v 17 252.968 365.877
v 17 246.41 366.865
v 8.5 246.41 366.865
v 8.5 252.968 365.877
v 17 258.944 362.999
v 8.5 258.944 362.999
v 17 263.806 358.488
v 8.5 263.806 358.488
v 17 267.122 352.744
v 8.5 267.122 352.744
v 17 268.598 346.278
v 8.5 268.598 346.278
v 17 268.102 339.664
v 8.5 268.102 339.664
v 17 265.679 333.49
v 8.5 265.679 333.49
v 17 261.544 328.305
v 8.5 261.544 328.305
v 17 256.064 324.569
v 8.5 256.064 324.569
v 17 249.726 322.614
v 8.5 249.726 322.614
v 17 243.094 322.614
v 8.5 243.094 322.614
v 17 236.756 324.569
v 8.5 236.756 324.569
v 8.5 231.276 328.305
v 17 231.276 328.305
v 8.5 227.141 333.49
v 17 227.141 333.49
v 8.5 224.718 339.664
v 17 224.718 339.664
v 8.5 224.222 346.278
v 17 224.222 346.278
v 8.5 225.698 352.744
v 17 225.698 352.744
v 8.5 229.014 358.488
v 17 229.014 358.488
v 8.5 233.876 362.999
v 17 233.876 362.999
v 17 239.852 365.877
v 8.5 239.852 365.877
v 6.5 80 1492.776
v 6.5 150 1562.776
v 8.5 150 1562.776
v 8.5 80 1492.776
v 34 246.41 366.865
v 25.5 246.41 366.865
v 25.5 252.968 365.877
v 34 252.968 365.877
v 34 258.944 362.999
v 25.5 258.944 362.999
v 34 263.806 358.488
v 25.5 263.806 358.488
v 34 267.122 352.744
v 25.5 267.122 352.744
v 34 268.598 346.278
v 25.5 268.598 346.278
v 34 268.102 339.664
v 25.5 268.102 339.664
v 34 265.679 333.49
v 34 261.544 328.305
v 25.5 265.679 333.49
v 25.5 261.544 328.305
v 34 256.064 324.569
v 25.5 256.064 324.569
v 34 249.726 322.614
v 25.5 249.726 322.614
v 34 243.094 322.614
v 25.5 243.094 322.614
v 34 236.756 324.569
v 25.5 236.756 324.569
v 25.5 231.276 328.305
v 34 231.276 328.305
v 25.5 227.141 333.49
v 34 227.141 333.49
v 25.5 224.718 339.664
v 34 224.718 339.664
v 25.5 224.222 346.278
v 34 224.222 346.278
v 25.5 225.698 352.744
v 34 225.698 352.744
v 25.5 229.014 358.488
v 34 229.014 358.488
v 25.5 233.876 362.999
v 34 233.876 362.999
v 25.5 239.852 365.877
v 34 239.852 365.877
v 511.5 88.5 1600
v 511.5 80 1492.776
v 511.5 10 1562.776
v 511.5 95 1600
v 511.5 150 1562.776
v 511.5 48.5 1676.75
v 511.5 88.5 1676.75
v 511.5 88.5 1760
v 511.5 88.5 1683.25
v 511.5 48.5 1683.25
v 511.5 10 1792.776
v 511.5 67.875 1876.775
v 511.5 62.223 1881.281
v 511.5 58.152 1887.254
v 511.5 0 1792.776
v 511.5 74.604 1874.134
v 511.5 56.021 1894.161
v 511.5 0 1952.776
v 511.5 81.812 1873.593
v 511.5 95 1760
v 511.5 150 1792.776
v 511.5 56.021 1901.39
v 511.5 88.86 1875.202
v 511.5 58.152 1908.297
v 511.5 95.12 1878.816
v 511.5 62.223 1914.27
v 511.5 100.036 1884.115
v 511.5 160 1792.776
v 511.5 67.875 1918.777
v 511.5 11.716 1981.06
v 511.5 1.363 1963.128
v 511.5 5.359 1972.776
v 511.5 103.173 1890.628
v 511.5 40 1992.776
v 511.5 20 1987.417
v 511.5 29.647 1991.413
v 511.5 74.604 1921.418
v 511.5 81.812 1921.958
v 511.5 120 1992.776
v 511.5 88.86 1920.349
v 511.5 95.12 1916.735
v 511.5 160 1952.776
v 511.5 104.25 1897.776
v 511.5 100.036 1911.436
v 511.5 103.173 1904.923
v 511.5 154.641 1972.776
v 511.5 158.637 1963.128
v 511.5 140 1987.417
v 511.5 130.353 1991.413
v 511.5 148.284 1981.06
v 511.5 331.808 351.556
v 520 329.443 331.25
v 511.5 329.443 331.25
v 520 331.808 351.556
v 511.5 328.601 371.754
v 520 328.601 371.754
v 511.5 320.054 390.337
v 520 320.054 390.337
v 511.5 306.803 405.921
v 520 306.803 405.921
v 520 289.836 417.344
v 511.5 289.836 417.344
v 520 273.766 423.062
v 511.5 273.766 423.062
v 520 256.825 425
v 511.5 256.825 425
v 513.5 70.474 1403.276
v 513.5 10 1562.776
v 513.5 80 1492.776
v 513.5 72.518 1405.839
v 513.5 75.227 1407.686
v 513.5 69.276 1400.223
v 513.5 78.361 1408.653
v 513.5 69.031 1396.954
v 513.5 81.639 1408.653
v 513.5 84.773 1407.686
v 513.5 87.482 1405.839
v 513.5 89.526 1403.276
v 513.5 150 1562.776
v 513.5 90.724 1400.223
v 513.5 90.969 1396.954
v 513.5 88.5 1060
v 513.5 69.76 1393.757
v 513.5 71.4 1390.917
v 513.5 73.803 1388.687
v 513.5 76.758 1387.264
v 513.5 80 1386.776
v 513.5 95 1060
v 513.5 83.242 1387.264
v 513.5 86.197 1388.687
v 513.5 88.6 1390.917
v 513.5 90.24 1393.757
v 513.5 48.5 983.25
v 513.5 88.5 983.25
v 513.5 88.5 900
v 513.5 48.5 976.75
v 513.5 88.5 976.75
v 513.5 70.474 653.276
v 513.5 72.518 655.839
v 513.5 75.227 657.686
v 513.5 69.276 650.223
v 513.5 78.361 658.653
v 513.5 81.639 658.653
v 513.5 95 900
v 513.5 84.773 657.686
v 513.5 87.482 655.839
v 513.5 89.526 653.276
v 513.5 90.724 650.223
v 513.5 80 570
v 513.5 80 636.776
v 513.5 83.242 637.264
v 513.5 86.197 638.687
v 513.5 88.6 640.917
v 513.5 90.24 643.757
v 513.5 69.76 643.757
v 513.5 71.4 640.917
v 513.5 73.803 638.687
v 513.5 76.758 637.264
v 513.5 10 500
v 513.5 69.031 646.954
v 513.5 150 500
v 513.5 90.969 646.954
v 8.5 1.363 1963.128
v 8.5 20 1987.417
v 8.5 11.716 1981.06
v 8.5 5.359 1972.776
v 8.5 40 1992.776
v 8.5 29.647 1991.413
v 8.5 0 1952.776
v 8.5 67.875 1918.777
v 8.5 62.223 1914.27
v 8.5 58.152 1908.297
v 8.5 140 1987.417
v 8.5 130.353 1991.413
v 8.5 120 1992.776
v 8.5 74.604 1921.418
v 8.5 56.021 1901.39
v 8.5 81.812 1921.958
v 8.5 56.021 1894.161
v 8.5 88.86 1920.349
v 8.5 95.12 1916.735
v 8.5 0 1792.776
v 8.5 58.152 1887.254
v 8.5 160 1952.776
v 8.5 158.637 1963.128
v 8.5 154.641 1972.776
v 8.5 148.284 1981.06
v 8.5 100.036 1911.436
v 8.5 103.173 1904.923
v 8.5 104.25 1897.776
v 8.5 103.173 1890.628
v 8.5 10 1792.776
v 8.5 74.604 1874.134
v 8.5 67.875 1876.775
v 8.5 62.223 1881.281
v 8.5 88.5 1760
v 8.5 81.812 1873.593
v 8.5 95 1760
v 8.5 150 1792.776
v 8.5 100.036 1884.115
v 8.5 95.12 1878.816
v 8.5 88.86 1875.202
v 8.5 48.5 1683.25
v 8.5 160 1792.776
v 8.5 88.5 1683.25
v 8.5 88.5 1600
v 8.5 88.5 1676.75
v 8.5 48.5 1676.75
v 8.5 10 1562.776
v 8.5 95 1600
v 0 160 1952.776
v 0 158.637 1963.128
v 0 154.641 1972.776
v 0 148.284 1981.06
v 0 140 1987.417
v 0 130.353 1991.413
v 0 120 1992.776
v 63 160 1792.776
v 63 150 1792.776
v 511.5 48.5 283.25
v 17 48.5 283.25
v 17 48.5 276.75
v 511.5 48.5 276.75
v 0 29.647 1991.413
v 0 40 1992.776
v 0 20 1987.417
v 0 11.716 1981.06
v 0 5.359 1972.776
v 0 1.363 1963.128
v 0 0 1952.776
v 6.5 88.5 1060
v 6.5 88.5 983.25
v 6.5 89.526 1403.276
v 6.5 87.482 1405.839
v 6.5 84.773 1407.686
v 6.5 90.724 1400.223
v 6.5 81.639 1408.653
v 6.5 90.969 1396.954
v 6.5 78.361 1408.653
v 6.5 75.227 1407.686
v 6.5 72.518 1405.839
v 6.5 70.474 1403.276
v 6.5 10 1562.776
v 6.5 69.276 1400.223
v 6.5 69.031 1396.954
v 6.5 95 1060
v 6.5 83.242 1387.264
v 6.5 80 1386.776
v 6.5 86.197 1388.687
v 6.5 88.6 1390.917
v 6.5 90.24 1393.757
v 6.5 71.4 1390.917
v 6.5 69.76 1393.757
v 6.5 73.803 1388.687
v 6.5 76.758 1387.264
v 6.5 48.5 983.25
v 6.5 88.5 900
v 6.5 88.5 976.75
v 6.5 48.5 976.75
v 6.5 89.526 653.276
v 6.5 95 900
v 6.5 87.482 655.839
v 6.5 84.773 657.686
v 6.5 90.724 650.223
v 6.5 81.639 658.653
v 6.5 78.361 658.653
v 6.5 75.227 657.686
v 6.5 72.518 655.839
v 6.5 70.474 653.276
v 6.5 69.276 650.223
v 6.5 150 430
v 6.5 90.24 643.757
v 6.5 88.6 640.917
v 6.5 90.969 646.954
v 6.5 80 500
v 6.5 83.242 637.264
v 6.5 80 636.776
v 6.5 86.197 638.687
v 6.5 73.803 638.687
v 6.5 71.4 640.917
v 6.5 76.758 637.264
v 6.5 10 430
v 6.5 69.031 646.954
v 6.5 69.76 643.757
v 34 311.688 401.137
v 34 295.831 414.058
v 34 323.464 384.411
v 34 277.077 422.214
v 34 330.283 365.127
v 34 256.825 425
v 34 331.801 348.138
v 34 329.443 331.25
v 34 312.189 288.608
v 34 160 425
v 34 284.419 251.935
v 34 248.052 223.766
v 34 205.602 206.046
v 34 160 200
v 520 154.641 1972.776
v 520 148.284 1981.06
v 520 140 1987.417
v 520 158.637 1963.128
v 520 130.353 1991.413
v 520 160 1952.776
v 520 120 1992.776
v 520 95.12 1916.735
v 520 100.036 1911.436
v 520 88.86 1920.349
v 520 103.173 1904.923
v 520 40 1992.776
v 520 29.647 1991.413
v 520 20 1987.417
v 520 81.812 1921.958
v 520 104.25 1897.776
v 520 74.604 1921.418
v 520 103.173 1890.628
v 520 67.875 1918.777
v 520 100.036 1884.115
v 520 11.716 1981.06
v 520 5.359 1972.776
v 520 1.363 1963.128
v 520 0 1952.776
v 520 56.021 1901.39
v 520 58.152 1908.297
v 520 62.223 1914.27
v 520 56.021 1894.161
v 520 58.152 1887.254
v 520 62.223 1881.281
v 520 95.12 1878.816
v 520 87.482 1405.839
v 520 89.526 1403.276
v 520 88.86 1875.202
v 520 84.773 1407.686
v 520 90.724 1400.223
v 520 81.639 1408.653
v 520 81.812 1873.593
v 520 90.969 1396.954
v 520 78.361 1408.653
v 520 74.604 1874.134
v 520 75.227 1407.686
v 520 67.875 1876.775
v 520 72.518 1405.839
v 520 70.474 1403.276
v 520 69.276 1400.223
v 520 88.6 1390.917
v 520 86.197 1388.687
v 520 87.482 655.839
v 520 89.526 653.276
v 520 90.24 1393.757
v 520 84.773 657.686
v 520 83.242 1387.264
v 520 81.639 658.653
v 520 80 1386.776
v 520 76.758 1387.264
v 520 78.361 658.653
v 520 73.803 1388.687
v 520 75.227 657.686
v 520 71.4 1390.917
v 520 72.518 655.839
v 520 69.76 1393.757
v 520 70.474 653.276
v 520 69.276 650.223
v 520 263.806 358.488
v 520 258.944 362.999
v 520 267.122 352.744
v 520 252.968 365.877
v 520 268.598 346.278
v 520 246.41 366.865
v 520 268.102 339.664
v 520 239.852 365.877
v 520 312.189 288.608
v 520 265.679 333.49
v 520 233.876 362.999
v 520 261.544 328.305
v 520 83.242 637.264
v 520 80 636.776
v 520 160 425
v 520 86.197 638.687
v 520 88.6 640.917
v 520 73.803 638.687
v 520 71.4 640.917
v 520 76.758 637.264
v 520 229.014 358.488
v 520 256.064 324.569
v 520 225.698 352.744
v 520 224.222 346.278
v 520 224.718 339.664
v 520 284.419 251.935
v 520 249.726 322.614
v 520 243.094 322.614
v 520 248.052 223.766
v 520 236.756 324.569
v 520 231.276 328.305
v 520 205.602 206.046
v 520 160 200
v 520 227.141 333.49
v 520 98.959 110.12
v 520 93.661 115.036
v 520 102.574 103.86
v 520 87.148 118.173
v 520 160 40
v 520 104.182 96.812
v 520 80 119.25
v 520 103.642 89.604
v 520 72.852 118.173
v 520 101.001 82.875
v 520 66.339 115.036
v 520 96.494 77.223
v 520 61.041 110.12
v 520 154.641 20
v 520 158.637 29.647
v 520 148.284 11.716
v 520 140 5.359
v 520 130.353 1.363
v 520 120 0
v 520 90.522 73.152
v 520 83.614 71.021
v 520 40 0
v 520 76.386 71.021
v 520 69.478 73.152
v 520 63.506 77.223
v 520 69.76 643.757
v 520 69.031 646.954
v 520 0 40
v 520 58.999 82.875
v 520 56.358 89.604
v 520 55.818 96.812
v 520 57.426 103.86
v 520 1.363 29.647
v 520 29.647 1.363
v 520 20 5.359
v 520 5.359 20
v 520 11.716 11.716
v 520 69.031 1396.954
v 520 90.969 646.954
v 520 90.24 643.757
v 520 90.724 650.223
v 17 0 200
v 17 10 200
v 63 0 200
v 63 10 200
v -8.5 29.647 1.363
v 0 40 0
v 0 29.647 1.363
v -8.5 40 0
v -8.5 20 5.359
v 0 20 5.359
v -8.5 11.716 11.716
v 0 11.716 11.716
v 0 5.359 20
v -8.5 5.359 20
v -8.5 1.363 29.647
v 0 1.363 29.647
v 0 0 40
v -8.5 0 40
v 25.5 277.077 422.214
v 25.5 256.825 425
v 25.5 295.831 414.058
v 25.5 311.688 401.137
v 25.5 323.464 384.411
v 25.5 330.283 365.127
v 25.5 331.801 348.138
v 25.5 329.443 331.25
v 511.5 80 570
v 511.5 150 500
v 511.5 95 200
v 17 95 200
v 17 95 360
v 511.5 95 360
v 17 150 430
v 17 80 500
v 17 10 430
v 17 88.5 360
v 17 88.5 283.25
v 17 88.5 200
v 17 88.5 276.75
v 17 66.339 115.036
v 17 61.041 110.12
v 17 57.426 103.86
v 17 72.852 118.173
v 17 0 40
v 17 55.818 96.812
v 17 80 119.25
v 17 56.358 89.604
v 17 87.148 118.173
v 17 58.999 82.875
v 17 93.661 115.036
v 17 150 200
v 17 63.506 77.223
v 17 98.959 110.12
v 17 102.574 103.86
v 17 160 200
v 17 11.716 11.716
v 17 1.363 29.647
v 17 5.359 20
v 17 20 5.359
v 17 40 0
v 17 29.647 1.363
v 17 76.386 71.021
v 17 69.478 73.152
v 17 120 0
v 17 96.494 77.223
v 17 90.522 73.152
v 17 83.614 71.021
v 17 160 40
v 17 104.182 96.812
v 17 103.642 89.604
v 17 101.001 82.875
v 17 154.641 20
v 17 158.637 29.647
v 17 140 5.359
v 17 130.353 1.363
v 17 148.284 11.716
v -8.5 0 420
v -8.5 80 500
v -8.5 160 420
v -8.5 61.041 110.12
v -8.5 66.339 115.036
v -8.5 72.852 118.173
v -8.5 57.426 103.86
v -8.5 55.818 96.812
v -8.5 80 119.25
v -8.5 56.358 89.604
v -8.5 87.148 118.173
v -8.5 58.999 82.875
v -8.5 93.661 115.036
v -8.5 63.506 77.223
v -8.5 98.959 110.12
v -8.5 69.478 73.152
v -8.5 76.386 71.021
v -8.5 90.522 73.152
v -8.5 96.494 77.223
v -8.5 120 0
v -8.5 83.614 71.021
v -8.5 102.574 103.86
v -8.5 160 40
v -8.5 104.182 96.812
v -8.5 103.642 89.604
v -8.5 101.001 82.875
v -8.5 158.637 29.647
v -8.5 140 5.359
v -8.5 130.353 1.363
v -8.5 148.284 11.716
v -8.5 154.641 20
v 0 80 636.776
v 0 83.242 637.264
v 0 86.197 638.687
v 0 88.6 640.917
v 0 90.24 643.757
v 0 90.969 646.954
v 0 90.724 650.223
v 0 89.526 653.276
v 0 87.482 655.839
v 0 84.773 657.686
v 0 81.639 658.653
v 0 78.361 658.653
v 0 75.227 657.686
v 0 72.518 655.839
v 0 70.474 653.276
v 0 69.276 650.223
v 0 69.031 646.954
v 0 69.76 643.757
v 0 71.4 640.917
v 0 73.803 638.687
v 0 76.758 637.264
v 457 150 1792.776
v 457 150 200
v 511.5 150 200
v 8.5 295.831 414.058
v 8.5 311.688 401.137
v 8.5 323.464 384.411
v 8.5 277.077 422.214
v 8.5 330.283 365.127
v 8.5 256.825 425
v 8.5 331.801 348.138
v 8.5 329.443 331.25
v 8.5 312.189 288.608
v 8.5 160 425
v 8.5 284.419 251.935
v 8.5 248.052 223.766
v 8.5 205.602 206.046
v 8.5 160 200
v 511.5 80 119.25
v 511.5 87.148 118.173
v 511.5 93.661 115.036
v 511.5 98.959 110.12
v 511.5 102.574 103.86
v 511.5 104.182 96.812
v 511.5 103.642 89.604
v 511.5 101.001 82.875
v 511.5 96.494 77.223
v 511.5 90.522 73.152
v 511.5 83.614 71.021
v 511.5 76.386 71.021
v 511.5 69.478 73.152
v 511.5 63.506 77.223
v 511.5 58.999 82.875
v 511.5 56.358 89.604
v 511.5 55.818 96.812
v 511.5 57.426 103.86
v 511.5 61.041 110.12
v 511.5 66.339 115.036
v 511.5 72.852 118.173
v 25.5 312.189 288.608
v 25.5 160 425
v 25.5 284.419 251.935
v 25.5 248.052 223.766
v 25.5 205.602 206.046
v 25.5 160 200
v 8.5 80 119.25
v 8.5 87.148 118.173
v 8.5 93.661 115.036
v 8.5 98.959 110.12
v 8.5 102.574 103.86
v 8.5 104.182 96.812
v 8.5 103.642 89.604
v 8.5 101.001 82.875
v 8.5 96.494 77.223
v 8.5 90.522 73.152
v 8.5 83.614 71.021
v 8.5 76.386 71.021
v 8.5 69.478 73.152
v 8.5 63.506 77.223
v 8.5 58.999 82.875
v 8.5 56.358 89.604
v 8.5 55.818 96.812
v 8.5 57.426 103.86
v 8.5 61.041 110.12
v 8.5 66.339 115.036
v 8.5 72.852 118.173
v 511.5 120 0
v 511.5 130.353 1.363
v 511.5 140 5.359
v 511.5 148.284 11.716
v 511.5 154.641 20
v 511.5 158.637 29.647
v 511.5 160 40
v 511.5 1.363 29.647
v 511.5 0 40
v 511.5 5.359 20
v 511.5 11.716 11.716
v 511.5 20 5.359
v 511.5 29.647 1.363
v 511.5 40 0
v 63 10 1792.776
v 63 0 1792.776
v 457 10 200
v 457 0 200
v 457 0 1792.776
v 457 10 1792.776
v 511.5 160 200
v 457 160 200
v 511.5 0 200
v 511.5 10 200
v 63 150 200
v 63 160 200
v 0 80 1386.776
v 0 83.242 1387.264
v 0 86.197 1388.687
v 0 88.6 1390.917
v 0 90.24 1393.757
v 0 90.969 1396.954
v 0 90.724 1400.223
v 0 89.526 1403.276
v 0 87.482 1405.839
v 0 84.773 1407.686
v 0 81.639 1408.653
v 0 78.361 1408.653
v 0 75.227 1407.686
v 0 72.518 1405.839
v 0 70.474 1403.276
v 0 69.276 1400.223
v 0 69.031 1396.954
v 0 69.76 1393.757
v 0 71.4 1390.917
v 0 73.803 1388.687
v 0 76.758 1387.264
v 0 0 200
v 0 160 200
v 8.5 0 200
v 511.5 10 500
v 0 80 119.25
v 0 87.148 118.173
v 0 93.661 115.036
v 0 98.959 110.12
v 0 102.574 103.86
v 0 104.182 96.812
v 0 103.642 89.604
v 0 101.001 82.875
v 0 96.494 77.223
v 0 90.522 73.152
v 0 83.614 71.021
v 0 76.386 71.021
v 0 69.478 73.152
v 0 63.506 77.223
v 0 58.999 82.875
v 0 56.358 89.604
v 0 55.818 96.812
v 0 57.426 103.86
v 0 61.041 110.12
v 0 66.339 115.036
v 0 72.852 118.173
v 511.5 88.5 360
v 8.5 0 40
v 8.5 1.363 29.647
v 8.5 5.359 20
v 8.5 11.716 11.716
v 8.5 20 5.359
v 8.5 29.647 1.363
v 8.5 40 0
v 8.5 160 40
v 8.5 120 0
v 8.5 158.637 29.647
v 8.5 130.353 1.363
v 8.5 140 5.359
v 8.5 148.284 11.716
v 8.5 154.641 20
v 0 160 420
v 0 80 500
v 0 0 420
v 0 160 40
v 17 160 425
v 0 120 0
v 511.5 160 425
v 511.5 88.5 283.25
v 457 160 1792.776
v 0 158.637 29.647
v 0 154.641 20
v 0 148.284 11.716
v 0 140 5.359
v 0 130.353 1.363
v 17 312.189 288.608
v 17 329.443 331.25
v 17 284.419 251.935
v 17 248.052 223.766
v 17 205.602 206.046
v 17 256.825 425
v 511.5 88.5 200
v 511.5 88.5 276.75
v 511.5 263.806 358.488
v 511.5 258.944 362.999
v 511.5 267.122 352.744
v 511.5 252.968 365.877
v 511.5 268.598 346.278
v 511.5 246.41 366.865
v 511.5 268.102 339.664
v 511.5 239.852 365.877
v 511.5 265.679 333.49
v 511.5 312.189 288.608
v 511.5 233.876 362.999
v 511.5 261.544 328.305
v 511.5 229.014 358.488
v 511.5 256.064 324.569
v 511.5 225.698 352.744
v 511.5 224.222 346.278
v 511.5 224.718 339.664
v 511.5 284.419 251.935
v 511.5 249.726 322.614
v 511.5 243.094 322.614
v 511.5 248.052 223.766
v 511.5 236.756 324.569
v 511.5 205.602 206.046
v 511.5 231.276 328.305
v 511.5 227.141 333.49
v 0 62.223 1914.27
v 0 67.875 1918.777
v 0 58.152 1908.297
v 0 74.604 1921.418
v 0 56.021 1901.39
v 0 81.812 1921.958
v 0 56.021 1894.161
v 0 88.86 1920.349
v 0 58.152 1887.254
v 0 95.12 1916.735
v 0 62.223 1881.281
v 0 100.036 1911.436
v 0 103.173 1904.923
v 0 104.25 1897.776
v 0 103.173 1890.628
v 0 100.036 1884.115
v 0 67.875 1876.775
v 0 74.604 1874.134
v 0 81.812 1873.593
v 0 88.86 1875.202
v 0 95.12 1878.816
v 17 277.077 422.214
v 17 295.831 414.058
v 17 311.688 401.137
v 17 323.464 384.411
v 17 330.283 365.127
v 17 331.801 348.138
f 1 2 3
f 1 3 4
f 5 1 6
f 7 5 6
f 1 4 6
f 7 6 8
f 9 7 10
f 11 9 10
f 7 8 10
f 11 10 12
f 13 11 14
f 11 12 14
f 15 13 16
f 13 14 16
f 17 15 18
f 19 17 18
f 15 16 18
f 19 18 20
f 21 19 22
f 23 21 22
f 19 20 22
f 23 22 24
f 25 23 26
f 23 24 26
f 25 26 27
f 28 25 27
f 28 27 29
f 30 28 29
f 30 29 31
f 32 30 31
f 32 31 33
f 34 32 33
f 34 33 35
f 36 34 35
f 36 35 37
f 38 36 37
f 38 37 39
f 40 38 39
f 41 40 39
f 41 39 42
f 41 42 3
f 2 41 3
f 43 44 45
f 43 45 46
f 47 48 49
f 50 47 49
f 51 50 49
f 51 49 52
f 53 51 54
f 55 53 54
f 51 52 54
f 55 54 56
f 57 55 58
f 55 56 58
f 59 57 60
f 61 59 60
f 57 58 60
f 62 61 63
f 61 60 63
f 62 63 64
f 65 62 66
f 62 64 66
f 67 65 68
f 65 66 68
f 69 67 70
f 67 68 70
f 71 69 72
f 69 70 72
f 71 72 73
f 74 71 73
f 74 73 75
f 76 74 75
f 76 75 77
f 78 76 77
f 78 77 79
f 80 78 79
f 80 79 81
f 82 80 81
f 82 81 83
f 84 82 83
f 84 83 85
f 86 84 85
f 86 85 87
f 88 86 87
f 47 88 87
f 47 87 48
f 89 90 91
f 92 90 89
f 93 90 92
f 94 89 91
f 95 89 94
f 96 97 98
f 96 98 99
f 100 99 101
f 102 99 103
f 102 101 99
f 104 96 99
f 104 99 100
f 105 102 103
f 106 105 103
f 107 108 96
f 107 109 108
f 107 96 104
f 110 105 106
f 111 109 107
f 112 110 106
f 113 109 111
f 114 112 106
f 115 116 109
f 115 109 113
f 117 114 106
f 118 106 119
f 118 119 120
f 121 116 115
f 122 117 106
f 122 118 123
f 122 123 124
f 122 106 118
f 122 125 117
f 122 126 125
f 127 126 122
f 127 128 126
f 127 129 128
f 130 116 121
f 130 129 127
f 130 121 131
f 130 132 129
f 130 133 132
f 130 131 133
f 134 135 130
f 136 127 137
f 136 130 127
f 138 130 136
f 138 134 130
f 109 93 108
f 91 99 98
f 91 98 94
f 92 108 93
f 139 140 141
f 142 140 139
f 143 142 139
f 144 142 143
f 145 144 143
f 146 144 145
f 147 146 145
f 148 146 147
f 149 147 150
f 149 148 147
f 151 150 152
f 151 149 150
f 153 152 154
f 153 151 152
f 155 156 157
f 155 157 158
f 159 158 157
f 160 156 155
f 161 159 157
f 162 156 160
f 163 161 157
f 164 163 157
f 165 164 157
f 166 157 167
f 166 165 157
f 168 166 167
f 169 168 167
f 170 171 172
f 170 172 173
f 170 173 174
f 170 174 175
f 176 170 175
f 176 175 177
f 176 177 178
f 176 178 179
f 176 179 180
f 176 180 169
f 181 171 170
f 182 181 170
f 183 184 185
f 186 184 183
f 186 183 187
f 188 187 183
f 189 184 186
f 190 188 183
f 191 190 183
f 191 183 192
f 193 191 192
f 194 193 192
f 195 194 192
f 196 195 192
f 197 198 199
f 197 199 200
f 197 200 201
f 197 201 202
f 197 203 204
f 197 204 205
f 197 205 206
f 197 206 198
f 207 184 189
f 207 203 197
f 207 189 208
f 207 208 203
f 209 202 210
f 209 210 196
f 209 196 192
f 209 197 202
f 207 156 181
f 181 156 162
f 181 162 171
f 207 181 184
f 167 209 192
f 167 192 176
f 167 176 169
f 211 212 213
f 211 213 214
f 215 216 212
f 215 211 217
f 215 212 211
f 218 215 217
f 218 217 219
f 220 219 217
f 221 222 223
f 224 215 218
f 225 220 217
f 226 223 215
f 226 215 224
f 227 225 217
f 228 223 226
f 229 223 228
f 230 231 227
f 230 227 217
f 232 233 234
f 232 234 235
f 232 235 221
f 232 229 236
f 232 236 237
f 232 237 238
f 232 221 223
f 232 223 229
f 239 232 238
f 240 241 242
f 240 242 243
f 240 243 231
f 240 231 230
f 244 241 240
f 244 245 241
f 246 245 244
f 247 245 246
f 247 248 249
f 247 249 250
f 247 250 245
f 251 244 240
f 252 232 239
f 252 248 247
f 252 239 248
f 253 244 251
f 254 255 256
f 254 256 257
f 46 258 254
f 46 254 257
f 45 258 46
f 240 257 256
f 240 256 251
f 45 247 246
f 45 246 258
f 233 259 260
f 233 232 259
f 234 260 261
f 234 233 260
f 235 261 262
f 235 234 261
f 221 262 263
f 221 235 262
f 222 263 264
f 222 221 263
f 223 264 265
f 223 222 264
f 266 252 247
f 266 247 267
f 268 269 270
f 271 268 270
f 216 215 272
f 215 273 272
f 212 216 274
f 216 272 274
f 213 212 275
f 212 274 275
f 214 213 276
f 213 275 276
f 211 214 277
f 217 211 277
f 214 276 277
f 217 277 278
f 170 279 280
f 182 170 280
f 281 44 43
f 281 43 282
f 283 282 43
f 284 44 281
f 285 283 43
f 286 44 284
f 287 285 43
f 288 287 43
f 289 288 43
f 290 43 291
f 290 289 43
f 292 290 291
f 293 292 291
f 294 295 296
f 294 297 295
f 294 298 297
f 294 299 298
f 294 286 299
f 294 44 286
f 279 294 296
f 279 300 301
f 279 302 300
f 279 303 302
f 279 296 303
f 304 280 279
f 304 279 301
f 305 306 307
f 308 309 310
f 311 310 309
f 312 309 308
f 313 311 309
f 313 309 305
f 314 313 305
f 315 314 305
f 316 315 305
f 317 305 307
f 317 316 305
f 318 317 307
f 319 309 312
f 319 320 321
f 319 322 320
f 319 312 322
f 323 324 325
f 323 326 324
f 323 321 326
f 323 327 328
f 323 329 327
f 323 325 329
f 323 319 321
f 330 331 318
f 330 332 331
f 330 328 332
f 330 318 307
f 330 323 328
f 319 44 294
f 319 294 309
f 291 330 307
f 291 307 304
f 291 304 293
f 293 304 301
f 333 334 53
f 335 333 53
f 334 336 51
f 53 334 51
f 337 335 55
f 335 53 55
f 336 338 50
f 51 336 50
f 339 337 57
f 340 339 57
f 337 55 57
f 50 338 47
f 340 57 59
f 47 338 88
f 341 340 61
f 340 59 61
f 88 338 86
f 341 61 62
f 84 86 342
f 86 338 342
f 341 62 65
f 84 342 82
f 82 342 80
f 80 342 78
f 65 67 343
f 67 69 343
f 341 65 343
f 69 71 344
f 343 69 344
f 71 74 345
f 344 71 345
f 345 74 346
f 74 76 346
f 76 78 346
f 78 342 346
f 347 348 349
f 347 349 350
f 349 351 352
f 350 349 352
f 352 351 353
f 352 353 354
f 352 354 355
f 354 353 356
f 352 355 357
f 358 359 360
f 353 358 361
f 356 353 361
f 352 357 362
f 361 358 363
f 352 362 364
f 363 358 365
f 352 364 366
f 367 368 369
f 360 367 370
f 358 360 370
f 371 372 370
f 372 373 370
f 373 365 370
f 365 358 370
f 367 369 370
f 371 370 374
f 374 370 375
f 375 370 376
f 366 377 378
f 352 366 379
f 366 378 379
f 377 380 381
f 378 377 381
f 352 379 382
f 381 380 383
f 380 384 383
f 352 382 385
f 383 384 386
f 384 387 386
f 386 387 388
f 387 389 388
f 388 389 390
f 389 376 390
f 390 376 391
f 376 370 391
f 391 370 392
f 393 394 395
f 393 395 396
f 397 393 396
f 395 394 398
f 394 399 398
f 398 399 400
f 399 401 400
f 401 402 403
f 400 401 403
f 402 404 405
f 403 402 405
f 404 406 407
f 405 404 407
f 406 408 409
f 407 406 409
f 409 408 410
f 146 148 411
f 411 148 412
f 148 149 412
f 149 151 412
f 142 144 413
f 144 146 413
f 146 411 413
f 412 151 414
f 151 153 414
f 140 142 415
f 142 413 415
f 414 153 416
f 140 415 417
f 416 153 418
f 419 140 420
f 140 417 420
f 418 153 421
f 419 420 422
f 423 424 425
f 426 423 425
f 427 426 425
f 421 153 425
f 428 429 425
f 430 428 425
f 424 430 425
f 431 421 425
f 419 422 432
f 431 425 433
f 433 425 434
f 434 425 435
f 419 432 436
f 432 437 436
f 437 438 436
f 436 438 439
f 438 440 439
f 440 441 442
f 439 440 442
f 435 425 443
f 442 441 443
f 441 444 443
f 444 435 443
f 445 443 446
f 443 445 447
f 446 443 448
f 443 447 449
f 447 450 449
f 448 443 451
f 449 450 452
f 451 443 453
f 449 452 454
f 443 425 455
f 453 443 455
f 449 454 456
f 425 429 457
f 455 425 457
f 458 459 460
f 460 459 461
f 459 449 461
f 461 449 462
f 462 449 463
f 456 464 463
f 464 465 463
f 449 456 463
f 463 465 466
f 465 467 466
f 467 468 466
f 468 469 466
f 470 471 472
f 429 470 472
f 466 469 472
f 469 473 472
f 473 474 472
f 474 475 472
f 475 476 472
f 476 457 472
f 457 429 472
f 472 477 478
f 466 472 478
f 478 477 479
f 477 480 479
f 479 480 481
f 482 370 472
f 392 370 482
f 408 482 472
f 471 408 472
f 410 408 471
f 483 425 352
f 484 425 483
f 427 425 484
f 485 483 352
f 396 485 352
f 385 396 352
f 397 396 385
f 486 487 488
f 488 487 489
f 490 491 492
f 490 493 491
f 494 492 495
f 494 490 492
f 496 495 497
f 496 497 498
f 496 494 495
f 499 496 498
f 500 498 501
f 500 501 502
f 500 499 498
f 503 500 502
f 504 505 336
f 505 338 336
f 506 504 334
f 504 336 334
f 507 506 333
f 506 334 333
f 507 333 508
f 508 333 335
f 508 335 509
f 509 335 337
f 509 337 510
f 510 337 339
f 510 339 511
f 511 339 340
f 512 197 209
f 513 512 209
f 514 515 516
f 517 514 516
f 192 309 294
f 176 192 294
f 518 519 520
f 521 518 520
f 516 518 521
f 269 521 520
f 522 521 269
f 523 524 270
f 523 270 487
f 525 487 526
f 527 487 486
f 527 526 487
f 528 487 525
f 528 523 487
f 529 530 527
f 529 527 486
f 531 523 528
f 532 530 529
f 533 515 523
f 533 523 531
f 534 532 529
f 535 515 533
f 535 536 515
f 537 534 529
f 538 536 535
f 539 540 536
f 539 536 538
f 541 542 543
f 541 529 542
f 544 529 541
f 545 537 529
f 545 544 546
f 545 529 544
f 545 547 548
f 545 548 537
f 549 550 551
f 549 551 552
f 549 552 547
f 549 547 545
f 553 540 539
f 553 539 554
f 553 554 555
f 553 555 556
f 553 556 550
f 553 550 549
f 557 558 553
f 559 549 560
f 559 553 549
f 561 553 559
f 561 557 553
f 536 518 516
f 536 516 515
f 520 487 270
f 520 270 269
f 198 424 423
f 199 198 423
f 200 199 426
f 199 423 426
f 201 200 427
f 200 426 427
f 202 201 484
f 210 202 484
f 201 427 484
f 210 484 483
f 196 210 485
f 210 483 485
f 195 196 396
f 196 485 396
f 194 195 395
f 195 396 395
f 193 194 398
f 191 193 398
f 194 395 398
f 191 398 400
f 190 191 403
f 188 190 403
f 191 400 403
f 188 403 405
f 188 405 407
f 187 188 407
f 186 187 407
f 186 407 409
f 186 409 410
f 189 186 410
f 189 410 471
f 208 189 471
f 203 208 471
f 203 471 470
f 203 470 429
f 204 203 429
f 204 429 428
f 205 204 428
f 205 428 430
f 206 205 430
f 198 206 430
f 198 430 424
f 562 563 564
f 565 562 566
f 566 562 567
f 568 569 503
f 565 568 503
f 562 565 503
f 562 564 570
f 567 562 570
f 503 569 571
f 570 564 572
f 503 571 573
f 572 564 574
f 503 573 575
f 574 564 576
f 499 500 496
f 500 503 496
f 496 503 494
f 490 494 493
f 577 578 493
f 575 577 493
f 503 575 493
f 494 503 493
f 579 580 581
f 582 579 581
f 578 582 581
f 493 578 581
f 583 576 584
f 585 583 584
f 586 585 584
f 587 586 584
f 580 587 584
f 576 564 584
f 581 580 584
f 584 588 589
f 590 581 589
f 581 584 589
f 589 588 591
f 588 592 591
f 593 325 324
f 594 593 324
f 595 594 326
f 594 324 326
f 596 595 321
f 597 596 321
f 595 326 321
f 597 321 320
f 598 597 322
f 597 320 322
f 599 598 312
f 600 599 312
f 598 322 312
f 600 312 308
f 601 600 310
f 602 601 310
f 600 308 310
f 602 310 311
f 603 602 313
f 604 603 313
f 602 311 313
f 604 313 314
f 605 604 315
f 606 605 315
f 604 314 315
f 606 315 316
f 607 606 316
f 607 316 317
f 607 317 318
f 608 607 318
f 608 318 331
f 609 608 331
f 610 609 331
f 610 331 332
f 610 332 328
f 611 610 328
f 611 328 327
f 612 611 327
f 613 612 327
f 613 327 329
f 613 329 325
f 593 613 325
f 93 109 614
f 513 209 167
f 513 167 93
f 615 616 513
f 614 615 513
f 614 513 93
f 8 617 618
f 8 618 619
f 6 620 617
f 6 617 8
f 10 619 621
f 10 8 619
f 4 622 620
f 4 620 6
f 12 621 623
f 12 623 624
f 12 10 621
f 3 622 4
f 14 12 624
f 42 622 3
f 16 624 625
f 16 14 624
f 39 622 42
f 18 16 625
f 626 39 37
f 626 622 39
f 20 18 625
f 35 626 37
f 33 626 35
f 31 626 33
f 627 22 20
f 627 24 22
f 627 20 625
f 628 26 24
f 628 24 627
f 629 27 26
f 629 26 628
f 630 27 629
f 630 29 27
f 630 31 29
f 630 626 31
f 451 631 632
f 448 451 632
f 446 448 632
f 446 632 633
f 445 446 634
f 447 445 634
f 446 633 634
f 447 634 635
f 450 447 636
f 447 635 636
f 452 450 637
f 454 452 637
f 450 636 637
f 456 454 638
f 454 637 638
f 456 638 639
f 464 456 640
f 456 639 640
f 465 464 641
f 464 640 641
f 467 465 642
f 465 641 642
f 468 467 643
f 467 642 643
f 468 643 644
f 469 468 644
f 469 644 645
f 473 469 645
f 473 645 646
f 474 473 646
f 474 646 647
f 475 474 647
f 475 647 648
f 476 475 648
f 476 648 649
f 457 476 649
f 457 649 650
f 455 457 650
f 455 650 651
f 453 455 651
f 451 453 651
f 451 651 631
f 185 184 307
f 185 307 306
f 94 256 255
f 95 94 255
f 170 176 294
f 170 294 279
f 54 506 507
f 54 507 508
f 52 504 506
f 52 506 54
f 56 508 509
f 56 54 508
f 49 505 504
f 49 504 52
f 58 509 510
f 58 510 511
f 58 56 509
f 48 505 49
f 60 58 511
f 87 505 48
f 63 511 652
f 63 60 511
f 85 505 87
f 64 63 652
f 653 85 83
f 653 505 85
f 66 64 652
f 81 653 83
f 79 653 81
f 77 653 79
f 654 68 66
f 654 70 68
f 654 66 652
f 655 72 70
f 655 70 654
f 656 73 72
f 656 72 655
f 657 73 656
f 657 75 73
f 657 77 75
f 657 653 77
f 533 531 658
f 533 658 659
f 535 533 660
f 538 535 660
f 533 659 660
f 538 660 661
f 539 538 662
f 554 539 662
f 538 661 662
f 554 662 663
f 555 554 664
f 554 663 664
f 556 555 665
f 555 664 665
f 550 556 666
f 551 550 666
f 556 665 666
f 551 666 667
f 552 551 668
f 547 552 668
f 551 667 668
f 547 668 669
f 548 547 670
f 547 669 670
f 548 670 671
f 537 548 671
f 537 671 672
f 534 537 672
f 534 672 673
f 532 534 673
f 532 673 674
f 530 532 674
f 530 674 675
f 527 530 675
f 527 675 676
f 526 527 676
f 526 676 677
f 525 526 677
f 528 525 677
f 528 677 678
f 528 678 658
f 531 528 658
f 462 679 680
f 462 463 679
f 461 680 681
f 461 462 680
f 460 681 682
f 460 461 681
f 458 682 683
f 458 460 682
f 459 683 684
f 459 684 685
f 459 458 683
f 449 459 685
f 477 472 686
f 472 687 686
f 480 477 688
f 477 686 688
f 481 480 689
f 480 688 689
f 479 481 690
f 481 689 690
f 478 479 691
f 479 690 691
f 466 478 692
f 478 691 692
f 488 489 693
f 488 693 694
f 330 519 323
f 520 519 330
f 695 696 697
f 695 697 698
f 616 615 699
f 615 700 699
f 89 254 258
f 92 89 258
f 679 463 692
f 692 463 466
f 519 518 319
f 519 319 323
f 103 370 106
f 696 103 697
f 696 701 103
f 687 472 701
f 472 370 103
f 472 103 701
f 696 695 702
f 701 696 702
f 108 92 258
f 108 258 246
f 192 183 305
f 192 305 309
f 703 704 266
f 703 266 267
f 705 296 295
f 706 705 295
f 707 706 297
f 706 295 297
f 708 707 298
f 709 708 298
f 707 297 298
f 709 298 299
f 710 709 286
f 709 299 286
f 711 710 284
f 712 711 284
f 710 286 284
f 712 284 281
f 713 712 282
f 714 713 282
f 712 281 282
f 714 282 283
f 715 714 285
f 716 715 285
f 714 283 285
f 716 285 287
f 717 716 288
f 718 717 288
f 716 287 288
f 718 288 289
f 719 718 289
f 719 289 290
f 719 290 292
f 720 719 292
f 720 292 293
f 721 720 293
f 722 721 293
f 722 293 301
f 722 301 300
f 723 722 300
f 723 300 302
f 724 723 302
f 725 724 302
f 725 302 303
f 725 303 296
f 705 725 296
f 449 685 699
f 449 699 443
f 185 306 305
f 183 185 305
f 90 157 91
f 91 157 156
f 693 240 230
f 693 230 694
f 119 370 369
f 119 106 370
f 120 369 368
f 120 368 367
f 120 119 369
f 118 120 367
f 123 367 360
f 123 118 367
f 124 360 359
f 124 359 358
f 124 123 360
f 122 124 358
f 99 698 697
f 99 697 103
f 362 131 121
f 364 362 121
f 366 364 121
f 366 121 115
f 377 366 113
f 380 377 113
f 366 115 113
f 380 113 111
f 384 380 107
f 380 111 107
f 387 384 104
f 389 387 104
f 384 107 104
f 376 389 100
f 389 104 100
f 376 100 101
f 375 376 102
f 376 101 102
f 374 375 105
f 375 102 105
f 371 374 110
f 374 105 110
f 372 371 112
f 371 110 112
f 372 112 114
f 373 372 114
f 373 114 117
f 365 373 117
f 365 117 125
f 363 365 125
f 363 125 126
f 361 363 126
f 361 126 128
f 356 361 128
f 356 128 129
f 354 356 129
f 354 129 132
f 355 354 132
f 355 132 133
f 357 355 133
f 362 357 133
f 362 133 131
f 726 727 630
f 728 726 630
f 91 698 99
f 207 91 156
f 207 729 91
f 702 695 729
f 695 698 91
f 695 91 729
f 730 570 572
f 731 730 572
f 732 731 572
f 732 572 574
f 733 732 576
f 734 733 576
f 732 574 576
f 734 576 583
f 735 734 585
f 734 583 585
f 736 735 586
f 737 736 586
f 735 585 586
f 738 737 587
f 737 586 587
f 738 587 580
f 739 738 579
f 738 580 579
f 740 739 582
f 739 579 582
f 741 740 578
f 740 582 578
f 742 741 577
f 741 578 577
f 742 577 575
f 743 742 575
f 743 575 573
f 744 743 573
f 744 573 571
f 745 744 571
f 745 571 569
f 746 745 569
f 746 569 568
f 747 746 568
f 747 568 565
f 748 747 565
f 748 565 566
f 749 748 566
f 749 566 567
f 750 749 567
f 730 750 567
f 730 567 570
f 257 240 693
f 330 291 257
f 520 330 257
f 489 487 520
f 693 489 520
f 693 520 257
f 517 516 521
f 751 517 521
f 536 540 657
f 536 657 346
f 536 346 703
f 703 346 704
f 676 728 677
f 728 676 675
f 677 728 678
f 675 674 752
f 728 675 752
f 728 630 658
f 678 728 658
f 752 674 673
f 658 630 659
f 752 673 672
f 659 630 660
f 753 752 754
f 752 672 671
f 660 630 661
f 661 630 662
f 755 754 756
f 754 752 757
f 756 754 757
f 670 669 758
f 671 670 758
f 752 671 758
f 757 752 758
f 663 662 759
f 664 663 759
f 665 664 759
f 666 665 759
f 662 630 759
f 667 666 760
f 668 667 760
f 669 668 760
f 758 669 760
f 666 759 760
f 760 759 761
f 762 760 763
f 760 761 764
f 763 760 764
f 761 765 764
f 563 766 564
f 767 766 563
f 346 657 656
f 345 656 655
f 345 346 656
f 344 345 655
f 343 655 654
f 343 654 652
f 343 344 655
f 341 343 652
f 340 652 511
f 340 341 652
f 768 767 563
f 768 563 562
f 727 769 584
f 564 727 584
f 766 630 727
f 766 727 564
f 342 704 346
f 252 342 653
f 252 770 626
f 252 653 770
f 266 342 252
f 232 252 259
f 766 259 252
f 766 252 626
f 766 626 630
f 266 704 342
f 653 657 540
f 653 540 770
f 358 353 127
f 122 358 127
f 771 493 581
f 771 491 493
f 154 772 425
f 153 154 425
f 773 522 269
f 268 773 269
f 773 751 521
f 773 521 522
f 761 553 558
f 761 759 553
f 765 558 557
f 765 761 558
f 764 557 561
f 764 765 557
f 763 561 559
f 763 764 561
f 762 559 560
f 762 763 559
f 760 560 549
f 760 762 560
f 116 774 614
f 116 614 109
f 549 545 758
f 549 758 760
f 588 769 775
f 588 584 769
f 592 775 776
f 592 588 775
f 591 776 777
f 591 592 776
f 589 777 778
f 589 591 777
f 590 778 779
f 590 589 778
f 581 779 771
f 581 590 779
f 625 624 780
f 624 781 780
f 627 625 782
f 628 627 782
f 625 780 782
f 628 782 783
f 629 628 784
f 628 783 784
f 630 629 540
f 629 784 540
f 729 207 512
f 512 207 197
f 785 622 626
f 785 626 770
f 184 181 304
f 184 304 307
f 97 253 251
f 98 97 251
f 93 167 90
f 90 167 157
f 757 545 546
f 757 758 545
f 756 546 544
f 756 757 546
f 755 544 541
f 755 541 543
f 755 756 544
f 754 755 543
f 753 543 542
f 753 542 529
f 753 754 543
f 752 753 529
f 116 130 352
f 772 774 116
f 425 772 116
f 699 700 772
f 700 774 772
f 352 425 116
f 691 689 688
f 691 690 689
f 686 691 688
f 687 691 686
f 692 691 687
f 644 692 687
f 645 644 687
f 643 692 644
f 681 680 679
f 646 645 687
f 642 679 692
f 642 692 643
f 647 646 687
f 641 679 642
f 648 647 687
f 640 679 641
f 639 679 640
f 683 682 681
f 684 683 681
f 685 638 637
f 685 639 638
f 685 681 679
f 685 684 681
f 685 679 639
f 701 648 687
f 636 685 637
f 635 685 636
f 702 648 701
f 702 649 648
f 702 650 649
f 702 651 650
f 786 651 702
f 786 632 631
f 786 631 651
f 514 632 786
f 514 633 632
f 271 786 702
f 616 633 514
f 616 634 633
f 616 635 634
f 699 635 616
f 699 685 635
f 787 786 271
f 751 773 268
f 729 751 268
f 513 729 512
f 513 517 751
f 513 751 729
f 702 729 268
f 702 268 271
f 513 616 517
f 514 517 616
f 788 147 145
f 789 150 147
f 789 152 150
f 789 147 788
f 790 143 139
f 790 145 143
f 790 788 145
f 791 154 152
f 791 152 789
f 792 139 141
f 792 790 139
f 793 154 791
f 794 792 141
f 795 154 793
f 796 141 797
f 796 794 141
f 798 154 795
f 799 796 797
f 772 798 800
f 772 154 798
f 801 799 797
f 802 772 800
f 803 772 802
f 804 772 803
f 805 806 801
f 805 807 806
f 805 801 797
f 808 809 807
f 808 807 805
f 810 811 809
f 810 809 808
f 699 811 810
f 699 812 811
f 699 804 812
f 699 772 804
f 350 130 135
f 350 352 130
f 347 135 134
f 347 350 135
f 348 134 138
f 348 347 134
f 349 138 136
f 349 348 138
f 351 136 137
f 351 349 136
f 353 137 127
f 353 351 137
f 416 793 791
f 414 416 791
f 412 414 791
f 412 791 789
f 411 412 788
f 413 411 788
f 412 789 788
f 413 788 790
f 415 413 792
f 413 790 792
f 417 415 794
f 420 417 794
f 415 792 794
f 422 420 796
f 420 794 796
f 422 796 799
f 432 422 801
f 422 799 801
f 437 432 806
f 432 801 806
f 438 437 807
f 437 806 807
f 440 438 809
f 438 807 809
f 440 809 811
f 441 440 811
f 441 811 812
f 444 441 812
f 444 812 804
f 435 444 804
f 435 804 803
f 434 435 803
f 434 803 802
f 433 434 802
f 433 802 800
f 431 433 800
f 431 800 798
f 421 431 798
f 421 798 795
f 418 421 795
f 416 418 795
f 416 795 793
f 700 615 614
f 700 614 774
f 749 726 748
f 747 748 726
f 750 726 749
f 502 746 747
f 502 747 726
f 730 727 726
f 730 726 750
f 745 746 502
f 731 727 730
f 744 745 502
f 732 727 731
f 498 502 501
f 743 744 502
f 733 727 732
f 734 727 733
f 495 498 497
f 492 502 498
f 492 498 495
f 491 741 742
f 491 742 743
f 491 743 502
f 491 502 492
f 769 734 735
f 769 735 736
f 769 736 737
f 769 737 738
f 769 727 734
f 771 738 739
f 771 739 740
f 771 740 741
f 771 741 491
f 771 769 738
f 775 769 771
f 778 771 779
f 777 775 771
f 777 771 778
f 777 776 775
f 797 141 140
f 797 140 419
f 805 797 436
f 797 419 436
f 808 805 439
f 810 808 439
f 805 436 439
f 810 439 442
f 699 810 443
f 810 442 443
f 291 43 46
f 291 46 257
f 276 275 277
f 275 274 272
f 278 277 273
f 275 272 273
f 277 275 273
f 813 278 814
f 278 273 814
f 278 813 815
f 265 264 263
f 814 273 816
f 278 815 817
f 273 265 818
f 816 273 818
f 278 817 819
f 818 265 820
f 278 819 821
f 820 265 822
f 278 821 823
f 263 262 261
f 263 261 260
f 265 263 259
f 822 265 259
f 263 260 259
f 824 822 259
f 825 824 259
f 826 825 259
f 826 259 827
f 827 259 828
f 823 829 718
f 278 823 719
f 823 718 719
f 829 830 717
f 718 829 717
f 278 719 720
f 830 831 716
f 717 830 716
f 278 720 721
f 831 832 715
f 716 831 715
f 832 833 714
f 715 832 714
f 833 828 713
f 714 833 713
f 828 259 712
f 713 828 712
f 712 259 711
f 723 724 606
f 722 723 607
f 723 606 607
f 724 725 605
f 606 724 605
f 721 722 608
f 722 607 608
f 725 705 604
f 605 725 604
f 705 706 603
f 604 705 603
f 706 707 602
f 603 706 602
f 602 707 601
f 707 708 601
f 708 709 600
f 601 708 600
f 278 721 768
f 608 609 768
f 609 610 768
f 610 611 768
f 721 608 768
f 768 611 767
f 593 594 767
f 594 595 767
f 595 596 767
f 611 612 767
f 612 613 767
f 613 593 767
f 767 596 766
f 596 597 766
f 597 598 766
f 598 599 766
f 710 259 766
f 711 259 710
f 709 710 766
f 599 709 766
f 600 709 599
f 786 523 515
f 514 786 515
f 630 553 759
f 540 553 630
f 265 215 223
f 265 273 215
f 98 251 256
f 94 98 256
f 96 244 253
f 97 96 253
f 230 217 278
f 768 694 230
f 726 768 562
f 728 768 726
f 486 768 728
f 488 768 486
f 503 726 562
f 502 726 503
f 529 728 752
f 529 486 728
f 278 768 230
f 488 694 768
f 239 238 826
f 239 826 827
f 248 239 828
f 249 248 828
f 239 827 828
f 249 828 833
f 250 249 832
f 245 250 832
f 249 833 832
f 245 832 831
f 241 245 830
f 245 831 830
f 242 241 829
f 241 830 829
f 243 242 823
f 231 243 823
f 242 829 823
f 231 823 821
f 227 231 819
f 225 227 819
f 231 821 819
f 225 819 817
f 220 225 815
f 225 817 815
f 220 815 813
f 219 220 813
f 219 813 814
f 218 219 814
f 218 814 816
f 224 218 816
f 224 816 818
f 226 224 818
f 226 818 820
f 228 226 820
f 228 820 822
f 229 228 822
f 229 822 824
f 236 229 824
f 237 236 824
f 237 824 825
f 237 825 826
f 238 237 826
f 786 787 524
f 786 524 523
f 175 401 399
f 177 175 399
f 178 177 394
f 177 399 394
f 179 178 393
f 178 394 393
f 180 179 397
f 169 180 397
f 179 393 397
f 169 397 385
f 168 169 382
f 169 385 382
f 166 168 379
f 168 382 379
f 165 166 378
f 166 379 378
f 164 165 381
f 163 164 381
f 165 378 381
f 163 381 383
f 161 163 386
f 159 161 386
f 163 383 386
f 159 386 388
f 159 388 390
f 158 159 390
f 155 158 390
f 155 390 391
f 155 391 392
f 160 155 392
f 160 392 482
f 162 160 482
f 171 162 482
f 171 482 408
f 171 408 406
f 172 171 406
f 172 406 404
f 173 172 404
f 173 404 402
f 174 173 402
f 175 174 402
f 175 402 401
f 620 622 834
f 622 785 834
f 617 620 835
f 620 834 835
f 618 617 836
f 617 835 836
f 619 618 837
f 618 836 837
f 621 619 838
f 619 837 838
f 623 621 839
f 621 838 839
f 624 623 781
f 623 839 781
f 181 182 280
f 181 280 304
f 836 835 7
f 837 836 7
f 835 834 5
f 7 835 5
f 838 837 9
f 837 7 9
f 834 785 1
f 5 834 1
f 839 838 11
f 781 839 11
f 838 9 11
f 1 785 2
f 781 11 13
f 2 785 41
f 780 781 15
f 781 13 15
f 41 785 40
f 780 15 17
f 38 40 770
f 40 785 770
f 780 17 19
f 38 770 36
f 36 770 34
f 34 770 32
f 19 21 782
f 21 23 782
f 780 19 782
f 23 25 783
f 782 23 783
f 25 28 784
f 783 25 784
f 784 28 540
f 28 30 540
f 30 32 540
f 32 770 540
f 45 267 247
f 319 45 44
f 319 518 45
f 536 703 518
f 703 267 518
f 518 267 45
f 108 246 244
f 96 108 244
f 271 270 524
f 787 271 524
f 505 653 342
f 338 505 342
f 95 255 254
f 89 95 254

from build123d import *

# Parameters (mm, degrees)
EXTRUDE_1_DEPTH        = 1992.775637732
EXTRUDE_1_2_DEPTH      = 1992.775637732
EXTRUDE_3_DEPTH        = 520
PATTERN_LINEAR_1_COUNT = 3
PATTERN_LINEAR_1_PITCH = 700
EXTRUDE_5_DEPTH        = 2
EXTRUDE_8_DEPTH        = 2
EXTRUDE_11_DEPTH       = 8.5
PATTERN_LINEAR_2_COUNT = 2
PATTERN_LINEAR_2_PITCH = 17
SKETCH_6_W             = 494.5
SKETCH_6_H             = 200
SKETCH_6_W_2           = 503
SKETCH_6_W_3           = 8.5
CUT_EXTRUDE_12_DEPTH   = 2066.709258908
SKETCH_20_R            = 24.25
CUT_EXTRUDE_13_DEPTH   = 2068.865322582
FILLET_1_R             = 40
SKETCH_21_W            = 8.5
SKETCH_21_H            = 225
EXTRUDE_14_DEPTH       = 175
SKETCH_22_R            = 22.25
CUT_EXTRUDE_15_DEPTH   = 2089.705817567
FILLET_2_R             = 175
FILLET_3_R             = 75
SKETCH_23_R            = 11
CUT_EXTRUDE_16_DEPTH   = 2089.198879915


with BuildPart() as part:
    # 草图2 → 拉伸1 (new body)
    with BuildSketch(Plane.XY):
        Polygon((0, 0), (0, 160), (63, 160), (63, 150), (6.5, 150), (6.5, 10), (63, 10), (63, 0), align=None)
    extrude(amount=EXTRUDE_1_DEPTH)



with BuildPart() as body_2:
    # 草图2 → Extrude 1 2 (new body)
    with BuildSketch(Plane.XY):
        Polygon((457, 160), (520, 160), (520, 0), (457, 0), (457, 10), (513.5, 10), (513.5, 150), (457, 150), align=None)
    extrude(amount=EXTRUDE_1_2_DEPTH)


with BuildPart() as part_1:
    add(part.part)

    add(body_2.part)  # 拉伸3 merges body 2
    # 草图5 → 拉伸3 (add)
    with BuildSketch(Plane.ZY):
        Polygon((200, 95), (360, 95), (360, 88.5), (283.25, 88.5), (283.25, 48.5), (276.75, 48.5), (276.75, 88.5), (200, 88.5), align=None)
    extrude_3 = extrude(amount=-EXTRUDE_3_DEPTH)

    # 阵列(线性)1: 拉伸3 ×3
    with Locations(*[(0, 0, i * PATTERN_LINEAR_1_PITCH) for i in range(1, PATTERN_LINEAR_1_COUNT)]):
        add(extrude_3)

    # 草图7 → 拉伸5 (add)
    with BuildSketch(Plane.ZY.offset(-513.5)):
        Polygon((0, 10), (500, 10), (570, 80), (500, 150), (0, 150), align=None)
        Polygon((1562.775637732, 150), (1492.775637732, 80), (1562.775637732, 10), (1992.775637732, 10), (1992.775637732, 150), align=None)
    extrude(amount=EXTRUDE_5_DEPTH)

    # 草图15 → 拉伸8 (add)
    with BuildSketch(Plane(origin=(6.5, 0, 0), x_dir=(0, 0, -1), z_dir=(1, 0, 0))):
        Polygon((-1992.775637732, 150), (-1562.775637732, 150), (-1492.775637732, 80), (-1562.775637732, 10), (-1992.775637732, 10), align=None)
        Polygon((-430, 150), (0, 150), (0, 10), (-430, 10), (-500, 80), align=None)
    extrude(amount=EXTRUDE_8_DEPTH)

    # 草图19 → 拉伸11 (add)
    with BuildSketch(Plane.ZY):
        Polygon((0, 160), (420, 160), (500, 80), (420, 0), (0, 0), align=None)
    extrude_11 = extrude(amount=EXTRUDE_11_DEPTH)

    # 阵列(线性)2: 拉伸11 ×2
    with Locations(*[(i * PATTERN_LINEAR_2_PITCH, 0, 0) for i in range(1, PATTERN_LINEAR_2_COUNT)]):
        add(extrude_11)

    # 草图6 → 拉伸12 (cut, through all)
    with BuildSketch(Plane(origin=(0, 160, 0), x_dir=(1, 0, 0), z_dir=(0, 1, 0))):
        with Locations((264.25, -100)):
            Rectangle(SKETCH_6_W, SKETCH_6_H)
        with Locations((260, -1892.775637732)):
            Rectangle(SKETCH_6_W_2, SKETCH_6_H)
        with Locations((4.25, -100)):
            Rectangle(SKETCH_6_W_3, SKETCH_6_H)
    extrude(amount=-CUT_EXTRUDE_12_DEPTH, mode=Mode.SUBTRACT)

    # 草图20 → 拉伸13 (cut, through all)
    with BuildSketch(Plane.ZY.offset(8.5)):
        with Locations((95, 80)):
            Circle(SKETCH_20_R)
        with Locations(Location((1897.775637732, 80, 0), (0, 0, 90))):
            Circle(SKETCH_20_R)
    extrude(amount=-CUT_EXTRUDE_13_DEPTH, mode=Mode.SUBTRACT)

    # 圆角1
    fillet_1_edges = [part_1.edges().sort_by_distance(p)[0] for p in [
        (4.25, 0, 1992.775637732),
        (4.25, 160, 1992.775637732),
        (515.75, 0, 1992.775637732),
        (515.75, 160, 1992.775637732),
        (-4.25, 0, 0),
        (12.75, 0, 0),
        (-4.25, 160, 0),
        (12.75, 160, 0),
        (515.75, 0, 0),
        (515.75, 160, 0),
    ]]
    fillet(fillet_1_edges, radius=FILLET_1_R)

    # 草图21 → 拉伸14 (add)
    with BuildSketch(Plane(origin=(0, 160, 0), x_dir=(1, 0, 0), z_dir=(0, 1, 0))):
        with Locations((515.75, -312.5)):
            Rectangle(SKETCH_21_W, SKETCH_21_H)
        with Locations((12.75, -312.5)):
            Rectangle(SKETCH_21_W, SKETCH_21_H)
        with Locations((29.75, -312.5)):
            Rectangle(SKETCH_21_W, SKETCH_21_H)
    extrude(amount=EXTRUDE_14_DEPTH)

    # 草图22 → 拉伸15 (cut, through all)
    with BuildSketch(Plane.ZY.offset(8.5)):
        with Locations((344.615088301, 246.410058868)):
            Circle(SKETCH_22_R)
    extrude(amount=-CUT_EXTRUDE_15_DEPTH, mode=Mode.SUBTRACT)

    # 圆角2
    fillet_2_edges = [part_1.edges().sort_by_distance(p)[0] for p in [
        (12.75, 335, 200),
        (515.75, 335, 200),
        (29.75, 335, 200),
    ]]
    fillet(fillet_2_edges, radius=FILLET_2_R - 0.0001)  # a hair under: the kernel refuses the full size

    # 圆角3
    fillet_3_edges = [part_1.edges().sort_by_distance(p)[0] for p in [
        (12.75, 335, 425),
        (515.75, 335, 425),
        (29.75, 335, 425),
    ]]
    fillet(fillet_3_edges, radius=FILLET_3_R)

    # 草图23 → 拉伸16 (cut, through all)
    with BuildSketch(Plane(origin=(520, 0, 0), x_dir=(0, 0, -1), z_dir=(1, 0, 0))):
        with Locations((-1397.775637732, 80)):
            Circle(SKETCH_23_R)
        with Locations((-647.775637732, 80)):
            Circle(SKETCH_23_R)
    extrude(amount=-CUT_EXTRUDE_16_DEPTH, mode=Mode.SUBTRACT)


solid = part_1.part
